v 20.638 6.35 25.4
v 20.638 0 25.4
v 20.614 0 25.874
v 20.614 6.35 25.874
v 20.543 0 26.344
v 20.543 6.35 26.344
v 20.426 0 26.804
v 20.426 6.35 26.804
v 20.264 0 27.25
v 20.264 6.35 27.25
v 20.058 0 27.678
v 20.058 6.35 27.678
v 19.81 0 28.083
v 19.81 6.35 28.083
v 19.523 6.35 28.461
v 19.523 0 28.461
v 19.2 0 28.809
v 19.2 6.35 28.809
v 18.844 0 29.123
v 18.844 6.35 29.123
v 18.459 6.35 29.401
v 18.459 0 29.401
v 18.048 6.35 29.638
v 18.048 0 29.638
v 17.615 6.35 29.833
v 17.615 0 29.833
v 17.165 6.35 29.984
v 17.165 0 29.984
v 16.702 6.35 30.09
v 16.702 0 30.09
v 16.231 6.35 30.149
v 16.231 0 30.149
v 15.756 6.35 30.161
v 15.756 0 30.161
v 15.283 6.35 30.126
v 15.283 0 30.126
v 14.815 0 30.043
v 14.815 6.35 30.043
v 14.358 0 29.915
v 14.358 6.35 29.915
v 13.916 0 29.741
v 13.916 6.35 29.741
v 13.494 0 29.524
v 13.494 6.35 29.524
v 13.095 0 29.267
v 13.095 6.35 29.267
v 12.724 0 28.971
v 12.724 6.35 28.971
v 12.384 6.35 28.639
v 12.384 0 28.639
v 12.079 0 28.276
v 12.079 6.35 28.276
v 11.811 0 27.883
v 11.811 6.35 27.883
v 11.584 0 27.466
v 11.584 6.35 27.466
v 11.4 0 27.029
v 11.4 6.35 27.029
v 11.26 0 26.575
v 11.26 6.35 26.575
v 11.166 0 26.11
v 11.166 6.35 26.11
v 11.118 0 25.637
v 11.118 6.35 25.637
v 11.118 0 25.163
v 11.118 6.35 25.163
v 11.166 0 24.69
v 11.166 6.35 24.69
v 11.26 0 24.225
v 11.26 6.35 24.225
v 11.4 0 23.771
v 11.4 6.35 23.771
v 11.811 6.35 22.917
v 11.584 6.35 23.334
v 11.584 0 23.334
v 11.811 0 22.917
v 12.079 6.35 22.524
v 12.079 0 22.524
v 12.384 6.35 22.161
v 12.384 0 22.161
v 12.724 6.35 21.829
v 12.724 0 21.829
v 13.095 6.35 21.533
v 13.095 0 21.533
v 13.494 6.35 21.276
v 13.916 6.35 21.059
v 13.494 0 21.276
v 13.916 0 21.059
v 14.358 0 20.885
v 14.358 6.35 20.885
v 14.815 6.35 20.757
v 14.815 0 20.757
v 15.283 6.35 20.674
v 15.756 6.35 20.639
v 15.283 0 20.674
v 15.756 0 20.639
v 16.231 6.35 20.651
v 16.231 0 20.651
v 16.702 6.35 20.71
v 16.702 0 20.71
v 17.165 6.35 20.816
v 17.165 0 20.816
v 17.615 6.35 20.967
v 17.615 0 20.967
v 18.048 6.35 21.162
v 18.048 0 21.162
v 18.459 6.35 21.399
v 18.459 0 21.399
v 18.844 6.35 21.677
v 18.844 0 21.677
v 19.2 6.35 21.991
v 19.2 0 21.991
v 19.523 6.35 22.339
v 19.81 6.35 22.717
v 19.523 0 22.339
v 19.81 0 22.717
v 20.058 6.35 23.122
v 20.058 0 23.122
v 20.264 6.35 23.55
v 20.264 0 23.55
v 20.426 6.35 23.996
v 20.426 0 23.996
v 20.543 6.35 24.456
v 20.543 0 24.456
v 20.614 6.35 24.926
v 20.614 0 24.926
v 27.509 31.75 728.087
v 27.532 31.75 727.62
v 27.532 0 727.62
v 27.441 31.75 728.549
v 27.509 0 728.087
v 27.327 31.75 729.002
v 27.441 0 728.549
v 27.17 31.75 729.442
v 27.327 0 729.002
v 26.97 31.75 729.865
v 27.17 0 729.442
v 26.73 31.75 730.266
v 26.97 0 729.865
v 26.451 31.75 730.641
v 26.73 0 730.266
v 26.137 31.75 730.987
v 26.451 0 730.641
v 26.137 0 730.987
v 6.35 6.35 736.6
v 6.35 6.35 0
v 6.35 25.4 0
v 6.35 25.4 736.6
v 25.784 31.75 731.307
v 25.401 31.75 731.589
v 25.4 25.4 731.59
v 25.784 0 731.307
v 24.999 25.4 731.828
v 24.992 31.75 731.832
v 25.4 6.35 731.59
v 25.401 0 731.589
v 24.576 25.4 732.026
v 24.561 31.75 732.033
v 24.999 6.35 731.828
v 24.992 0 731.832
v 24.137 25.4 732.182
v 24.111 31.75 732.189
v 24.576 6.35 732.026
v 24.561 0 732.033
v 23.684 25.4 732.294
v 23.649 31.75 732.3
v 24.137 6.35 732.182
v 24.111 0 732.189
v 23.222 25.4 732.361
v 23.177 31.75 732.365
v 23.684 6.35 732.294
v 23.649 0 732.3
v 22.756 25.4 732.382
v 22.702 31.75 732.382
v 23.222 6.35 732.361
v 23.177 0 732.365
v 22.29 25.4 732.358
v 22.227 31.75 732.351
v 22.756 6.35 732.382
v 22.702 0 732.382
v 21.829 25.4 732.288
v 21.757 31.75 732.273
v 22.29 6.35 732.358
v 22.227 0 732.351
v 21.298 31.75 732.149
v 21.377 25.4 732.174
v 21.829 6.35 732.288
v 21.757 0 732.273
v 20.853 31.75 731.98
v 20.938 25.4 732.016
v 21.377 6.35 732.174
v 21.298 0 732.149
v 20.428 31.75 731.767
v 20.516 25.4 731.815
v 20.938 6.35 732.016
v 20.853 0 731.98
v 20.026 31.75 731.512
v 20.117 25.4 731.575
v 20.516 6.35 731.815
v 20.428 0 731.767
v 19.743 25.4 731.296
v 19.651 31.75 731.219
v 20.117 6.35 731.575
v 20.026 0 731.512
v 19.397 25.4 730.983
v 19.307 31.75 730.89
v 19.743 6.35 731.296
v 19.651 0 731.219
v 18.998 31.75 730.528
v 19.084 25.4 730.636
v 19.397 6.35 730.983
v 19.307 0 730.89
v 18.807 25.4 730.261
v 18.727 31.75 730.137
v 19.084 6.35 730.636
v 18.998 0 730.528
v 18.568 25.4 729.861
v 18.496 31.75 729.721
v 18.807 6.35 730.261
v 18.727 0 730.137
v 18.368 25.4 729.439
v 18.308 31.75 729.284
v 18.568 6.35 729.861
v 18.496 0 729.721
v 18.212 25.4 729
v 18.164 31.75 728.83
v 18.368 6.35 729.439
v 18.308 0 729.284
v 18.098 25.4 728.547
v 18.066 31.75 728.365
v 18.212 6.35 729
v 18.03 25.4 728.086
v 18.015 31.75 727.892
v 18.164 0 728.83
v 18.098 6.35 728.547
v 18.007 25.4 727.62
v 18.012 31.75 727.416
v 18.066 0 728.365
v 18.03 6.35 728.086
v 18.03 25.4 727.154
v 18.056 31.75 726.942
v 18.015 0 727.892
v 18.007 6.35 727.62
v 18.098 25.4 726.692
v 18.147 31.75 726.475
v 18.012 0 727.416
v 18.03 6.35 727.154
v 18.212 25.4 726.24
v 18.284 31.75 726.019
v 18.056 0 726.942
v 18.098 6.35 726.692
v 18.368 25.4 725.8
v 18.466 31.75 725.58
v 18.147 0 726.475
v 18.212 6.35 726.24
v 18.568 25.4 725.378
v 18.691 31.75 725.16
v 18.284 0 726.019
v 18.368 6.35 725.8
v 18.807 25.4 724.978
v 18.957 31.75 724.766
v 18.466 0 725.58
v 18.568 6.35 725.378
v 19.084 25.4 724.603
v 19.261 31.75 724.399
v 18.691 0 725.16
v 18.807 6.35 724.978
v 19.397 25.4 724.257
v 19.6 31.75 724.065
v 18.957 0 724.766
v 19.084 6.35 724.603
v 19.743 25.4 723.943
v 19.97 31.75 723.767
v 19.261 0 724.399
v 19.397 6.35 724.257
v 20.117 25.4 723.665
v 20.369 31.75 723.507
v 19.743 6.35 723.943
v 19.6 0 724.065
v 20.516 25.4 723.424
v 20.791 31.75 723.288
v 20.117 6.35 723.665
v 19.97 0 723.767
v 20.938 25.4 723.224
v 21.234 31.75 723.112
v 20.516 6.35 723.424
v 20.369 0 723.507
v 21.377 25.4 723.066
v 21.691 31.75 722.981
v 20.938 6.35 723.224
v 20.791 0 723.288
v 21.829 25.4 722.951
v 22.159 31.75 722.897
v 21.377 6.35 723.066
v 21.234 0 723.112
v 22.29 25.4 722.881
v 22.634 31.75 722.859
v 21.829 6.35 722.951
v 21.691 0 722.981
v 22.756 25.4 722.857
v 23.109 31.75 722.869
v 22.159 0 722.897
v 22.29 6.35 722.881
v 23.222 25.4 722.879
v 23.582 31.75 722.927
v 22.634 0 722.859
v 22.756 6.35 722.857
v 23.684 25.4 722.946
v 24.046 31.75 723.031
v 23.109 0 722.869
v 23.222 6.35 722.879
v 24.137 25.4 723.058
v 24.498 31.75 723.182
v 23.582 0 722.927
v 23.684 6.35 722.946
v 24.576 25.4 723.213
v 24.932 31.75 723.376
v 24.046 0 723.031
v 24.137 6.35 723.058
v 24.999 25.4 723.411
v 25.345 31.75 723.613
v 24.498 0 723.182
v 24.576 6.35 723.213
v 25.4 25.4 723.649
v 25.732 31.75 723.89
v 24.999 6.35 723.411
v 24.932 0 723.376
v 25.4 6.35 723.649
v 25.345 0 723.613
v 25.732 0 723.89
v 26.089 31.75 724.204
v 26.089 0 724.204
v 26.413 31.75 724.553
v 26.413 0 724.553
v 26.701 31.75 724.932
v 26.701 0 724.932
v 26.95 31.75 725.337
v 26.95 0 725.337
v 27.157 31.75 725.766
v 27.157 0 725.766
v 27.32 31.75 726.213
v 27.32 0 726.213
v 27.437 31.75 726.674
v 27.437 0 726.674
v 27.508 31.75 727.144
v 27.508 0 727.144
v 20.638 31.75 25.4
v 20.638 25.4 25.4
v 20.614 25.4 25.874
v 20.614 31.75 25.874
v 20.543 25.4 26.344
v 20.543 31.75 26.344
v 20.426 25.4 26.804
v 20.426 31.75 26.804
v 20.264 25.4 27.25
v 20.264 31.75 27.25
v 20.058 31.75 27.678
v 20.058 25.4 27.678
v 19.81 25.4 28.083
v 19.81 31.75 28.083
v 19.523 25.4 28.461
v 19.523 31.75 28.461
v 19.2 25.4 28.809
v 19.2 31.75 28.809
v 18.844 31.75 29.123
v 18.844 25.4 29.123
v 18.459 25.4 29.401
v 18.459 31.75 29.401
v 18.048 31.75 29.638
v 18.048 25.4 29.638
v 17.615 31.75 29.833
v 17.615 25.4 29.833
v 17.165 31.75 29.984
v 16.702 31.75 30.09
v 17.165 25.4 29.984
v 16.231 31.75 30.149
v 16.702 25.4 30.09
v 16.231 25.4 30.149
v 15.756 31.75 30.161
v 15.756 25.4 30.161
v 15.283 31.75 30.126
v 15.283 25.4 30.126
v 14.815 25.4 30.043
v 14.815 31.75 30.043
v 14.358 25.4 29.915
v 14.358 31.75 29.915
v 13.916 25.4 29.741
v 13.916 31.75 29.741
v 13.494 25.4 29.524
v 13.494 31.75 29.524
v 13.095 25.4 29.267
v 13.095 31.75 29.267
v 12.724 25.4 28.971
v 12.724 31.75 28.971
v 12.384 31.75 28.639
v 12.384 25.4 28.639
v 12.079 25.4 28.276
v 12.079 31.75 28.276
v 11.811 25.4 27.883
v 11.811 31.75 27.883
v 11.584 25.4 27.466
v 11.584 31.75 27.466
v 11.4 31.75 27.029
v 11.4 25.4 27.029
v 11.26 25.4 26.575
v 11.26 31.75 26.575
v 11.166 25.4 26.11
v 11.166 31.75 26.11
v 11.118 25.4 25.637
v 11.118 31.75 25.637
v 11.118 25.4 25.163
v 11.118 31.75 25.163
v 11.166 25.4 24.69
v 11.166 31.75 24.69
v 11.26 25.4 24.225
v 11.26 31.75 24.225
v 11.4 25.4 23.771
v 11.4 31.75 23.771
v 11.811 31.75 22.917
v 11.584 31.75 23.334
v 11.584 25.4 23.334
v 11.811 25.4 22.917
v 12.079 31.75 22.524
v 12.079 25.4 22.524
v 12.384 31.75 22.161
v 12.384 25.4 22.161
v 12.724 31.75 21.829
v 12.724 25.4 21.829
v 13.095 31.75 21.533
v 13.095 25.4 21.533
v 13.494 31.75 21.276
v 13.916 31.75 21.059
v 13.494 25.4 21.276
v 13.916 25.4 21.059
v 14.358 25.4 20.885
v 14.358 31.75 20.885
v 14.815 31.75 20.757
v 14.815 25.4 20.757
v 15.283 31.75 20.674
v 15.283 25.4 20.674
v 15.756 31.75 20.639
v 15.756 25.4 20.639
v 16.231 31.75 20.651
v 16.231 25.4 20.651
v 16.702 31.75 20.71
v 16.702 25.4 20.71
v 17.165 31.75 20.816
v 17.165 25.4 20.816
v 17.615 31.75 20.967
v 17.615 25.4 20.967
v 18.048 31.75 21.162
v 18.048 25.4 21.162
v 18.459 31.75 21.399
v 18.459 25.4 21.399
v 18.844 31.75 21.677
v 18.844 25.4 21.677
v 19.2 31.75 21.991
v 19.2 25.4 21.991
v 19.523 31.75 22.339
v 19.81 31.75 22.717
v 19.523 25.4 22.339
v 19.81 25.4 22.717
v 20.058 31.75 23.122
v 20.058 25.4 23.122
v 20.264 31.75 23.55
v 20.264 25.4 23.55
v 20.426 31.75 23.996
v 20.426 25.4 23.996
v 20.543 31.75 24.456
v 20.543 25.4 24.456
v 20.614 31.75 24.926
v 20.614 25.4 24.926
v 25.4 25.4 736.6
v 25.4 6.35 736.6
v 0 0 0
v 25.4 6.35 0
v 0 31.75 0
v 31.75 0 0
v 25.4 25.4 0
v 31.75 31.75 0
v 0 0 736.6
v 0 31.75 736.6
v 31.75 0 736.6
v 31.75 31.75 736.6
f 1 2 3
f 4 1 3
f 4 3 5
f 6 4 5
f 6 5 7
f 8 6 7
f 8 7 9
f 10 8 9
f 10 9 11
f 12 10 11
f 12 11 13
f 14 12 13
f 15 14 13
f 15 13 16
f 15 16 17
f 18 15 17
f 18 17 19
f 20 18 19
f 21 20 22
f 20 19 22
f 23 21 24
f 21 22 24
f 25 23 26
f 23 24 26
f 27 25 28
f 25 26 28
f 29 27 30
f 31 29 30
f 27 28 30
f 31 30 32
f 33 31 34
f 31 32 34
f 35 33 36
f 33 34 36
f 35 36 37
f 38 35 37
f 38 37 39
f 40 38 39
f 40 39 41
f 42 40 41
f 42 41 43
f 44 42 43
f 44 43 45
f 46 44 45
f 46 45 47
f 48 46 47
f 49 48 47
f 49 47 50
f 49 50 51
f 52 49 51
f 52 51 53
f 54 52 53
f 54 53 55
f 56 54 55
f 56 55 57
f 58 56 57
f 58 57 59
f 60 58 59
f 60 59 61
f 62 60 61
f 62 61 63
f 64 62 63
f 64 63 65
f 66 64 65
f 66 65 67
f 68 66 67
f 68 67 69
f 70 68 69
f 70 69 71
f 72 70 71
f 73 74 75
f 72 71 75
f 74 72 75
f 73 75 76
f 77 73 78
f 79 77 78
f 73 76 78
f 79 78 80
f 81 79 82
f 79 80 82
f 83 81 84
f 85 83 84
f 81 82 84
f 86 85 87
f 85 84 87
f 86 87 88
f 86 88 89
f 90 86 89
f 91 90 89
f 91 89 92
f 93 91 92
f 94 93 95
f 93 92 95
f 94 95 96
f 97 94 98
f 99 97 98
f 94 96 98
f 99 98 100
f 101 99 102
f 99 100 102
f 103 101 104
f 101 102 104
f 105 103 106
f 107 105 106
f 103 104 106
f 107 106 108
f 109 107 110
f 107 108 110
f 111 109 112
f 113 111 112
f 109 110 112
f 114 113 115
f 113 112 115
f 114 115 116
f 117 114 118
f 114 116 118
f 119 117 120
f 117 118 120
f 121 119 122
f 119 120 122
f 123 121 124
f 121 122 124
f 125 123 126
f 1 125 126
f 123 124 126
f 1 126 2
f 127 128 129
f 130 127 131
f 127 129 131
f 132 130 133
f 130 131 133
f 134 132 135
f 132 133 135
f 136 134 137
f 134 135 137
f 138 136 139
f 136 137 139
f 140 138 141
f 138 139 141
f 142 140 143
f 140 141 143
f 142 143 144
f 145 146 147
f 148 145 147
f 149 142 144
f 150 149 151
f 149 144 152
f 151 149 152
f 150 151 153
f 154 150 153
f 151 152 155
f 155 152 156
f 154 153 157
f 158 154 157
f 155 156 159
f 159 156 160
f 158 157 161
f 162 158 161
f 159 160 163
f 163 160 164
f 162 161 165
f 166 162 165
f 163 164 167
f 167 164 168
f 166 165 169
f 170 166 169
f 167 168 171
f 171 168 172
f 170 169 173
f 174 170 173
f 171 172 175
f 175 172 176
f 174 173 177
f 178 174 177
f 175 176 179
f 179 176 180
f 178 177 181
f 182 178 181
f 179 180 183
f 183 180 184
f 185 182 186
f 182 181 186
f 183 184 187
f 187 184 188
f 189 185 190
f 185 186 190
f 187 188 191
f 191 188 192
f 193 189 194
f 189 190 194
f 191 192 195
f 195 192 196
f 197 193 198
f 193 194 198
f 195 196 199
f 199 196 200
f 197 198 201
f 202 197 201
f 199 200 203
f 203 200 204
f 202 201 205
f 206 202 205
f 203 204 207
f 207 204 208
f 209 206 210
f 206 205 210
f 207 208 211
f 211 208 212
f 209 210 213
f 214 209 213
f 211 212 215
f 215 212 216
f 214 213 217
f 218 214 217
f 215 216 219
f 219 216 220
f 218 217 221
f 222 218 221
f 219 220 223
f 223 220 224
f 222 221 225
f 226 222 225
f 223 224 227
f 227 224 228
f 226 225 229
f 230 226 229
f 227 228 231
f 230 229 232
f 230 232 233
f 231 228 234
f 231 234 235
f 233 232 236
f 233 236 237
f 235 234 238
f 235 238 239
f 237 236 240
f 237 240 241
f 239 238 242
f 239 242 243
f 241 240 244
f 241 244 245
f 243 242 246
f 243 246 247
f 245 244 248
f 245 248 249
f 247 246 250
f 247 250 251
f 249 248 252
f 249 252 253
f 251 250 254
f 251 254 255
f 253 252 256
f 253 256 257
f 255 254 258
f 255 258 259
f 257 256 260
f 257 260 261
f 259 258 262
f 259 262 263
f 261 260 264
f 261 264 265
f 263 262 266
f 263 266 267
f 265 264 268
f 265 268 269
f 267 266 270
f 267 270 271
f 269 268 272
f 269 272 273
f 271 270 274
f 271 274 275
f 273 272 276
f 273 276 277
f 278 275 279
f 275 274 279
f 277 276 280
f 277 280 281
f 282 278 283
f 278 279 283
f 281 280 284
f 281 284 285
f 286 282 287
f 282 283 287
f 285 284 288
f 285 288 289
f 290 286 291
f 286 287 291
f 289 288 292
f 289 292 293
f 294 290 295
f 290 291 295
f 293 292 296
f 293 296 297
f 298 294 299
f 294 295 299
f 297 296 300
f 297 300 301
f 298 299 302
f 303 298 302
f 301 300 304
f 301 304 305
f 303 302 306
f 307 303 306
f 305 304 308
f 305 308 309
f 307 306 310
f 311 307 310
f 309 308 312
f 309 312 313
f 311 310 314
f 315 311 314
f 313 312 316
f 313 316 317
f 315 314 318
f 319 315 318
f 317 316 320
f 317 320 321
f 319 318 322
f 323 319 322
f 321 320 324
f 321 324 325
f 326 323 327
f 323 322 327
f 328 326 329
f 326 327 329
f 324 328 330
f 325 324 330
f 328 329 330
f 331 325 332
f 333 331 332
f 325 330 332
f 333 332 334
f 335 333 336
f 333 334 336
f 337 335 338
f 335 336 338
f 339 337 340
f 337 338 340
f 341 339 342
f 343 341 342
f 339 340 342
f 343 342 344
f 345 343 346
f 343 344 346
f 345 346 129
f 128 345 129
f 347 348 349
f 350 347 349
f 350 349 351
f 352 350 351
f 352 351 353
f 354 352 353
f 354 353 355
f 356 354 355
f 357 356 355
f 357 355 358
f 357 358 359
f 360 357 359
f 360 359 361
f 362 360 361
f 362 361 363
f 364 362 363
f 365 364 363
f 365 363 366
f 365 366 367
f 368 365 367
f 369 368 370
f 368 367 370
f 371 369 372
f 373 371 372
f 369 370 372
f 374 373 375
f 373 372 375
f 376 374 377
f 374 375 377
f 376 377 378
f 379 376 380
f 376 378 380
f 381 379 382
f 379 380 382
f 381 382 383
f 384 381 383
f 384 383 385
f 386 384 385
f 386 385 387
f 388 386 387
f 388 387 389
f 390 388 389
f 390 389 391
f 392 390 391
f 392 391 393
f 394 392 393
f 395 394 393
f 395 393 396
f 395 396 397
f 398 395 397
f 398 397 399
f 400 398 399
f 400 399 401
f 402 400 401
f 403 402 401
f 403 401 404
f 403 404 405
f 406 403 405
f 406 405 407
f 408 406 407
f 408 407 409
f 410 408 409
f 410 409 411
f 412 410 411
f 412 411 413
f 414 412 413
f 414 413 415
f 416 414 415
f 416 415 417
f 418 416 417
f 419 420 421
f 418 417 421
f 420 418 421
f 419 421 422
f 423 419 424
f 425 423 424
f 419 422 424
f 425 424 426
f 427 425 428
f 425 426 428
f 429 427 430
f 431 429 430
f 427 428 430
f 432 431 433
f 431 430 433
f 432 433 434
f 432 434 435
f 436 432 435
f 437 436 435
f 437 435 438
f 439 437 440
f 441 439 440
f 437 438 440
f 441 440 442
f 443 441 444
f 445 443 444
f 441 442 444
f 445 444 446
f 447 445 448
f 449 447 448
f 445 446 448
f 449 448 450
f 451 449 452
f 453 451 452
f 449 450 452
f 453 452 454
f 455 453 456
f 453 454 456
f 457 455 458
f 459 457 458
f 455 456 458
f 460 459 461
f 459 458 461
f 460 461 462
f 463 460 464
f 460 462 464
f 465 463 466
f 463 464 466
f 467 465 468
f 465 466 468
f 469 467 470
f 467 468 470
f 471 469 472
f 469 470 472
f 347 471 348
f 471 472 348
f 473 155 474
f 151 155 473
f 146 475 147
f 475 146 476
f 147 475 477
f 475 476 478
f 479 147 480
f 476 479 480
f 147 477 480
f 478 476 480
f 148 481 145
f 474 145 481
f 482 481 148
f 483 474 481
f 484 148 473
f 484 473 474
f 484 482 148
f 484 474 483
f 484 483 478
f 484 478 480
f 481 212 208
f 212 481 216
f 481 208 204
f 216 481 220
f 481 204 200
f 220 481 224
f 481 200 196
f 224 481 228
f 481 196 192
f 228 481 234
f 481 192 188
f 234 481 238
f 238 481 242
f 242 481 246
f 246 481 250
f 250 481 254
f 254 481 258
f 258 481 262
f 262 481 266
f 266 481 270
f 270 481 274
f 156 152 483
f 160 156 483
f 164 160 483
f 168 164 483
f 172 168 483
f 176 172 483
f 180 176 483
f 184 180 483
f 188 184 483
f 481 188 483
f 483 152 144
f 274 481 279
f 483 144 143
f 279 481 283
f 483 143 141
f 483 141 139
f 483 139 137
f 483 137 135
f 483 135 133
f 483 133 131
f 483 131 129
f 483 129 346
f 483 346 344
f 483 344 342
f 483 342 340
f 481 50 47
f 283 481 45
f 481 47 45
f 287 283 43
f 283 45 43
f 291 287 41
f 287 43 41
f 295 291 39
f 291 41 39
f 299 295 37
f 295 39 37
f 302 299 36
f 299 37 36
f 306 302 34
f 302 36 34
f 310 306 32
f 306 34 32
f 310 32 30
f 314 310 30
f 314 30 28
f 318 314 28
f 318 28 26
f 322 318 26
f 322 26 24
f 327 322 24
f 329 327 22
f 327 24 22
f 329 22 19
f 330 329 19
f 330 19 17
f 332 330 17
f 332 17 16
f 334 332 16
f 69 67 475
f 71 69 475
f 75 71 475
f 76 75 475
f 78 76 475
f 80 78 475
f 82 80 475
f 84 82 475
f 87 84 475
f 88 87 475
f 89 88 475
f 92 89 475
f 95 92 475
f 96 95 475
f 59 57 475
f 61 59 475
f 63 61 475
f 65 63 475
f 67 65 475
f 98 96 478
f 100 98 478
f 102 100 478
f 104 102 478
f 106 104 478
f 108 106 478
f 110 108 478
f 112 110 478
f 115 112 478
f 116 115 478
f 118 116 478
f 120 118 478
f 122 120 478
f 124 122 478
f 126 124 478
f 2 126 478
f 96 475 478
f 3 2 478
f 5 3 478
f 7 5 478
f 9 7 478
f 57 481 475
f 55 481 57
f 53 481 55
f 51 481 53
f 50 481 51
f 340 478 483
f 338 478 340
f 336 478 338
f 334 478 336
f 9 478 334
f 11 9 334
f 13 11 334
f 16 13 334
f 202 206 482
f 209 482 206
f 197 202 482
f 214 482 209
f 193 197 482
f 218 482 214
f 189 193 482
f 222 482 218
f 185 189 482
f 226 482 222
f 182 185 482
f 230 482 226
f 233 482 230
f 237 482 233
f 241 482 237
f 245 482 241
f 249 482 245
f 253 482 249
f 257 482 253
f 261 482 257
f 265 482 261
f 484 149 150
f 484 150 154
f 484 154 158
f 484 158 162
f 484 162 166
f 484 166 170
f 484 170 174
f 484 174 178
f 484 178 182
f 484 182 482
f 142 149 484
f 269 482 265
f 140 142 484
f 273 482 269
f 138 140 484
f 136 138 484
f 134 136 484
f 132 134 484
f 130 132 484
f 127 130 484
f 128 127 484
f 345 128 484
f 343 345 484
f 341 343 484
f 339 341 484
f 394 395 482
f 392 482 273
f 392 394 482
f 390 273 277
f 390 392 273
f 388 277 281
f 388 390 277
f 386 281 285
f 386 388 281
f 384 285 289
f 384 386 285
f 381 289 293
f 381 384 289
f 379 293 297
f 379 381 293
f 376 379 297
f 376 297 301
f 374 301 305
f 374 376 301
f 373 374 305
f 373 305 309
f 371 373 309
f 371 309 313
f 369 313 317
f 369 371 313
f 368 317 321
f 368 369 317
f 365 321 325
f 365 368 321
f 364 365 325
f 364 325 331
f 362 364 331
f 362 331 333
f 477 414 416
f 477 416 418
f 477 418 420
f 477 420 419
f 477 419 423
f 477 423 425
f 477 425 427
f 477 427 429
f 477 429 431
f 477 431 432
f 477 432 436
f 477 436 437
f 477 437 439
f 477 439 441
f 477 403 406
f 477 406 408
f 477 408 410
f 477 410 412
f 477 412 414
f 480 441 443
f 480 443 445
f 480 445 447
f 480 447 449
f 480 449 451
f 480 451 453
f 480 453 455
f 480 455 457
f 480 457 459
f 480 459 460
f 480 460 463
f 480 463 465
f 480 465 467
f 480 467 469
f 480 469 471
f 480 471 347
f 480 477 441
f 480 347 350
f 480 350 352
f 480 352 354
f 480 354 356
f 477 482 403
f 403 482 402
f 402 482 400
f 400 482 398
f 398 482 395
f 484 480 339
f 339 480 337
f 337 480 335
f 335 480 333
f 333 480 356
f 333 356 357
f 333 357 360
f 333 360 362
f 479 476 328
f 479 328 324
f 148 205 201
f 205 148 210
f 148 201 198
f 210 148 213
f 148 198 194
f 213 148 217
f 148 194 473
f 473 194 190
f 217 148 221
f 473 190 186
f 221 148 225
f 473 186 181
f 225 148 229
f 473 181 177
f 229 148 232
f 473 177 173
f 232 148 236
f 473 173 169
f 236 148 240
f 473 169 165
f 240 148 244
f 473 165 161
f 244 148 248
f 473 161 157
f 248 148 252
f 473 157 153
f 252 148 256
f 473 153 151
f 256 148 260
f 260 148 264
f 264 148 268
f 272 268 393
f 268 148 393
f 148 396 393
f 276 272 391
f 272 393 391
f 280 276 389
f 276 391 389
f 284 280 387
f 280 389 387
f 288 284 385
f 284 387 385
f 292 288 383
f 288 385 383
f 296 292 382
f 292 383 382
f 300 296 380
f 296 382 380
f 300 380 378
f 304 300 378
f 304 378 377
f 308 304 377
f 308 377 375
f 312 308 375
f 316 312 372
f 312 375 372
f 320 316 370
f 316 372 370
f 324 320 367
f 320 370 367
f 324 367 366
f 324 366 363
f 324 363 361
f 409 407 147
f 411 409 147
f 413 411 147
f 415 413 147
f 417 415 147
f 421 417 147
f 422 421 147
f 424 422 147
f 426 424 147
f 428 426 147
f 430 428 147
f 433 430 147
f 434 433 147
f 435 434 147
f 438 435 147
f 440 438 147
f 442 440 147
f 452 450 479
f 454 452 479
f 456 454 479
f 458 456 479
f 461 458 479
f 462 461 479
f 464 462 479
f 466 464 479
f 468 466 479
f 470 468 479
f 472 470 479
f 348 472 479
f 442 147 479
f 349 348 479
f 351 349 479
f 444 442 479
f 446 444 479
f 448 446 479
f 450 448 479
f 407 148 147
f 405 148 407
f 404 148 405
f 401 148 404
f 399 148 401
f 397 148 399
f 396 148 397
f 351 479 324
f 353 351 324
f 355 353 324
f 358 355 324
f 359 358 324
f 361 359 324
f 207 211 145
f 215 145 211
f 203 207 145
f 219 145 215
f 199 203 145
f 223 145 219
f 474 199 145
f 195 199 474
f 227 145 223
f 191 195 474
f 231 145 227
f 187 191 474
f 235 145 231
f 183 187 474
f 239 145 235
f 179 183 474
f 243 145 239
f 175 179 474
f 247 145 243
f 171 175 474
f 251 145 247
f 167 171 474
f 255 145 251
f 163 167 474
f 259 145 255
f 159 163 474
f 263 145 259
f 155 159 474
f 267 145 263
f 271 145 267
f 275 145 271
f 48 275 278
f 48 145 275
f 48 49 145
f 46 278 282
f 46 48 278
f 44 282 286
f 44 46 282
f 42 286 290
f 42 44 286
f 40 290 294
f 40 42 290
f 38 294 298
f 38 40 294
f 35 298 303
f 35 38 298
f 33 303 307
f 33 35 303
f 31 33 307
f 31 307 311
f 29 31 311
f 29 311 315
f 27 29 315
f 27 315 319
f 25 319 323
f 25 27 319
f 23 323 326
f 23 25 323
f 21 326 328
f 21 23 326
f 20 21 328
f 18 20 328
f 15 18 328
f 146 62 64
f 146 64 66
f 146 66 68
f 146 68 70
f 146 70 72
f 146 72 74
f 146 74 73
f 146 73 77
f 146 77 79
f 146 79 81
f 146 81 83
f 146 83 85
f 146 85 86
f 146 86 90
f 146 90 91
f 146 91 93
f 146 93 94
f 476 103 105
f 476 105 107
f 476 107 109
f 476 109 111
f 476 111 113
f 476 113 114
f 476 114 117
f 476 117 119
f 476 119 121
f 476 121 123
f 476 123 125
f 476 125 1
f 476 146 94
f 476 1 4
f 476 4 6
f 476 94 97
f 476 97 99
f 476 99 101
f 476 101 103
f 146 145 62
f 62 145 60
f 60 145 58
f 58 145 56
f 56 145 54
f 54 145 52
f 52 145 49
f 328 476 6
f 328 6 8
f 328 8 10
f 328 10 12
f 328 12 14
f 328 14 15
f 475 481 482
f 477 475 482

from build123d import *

# Parameters (mm, degrees)
F0_W     = 31.75
F0_H     = 31.75
F0_W_2   = 19.05
F0_H_2   = 19.05
F1_DEPTH = 736.6
F2_R     = 4.7625
F3_DEPTH = 31.751
F5_DEPTH = 31.751


with BuildPart() as f1:
    # F0 (on Top) → F1 (new body)
    with BuildSketch(Plane.XY):
        with Locations((15.875, 15.875)):
            Rectangle(F0_W, F0_H)
        with Locations((15.875, 15.875)):
            Rectangle(F0_W_2, F0_H_2, mode=Mode.SUBTRACT)
    extrude(amount=F1_DEPTH)

    # F2 (on face) → F3 (cut, through all)
    with BuildSketch(Plane.XZ):
        with Locations((15.875, 25.4)):
            Circle(F2_R)
    extrude(amount=-F3_DEPTH, mode=Mode.SUBTRACT)

    # F4 (on face) → F5 (cut, through all)
    with BuildSketch(Plane.XZ):
        with BuildLine():
            ThreePointArc((27.532244, 727.619744), (27.16972, 729.442274), (26.13734, 730.98734))
            ThreePointArc((26.13734, 730.98734), (18.369768, 725.797214), (27.532244, 727.619744))
        make_face()
    extrude(amount=-F5_DEPTH, mode=Mode.SUBTRACT)


solid = f1.part
